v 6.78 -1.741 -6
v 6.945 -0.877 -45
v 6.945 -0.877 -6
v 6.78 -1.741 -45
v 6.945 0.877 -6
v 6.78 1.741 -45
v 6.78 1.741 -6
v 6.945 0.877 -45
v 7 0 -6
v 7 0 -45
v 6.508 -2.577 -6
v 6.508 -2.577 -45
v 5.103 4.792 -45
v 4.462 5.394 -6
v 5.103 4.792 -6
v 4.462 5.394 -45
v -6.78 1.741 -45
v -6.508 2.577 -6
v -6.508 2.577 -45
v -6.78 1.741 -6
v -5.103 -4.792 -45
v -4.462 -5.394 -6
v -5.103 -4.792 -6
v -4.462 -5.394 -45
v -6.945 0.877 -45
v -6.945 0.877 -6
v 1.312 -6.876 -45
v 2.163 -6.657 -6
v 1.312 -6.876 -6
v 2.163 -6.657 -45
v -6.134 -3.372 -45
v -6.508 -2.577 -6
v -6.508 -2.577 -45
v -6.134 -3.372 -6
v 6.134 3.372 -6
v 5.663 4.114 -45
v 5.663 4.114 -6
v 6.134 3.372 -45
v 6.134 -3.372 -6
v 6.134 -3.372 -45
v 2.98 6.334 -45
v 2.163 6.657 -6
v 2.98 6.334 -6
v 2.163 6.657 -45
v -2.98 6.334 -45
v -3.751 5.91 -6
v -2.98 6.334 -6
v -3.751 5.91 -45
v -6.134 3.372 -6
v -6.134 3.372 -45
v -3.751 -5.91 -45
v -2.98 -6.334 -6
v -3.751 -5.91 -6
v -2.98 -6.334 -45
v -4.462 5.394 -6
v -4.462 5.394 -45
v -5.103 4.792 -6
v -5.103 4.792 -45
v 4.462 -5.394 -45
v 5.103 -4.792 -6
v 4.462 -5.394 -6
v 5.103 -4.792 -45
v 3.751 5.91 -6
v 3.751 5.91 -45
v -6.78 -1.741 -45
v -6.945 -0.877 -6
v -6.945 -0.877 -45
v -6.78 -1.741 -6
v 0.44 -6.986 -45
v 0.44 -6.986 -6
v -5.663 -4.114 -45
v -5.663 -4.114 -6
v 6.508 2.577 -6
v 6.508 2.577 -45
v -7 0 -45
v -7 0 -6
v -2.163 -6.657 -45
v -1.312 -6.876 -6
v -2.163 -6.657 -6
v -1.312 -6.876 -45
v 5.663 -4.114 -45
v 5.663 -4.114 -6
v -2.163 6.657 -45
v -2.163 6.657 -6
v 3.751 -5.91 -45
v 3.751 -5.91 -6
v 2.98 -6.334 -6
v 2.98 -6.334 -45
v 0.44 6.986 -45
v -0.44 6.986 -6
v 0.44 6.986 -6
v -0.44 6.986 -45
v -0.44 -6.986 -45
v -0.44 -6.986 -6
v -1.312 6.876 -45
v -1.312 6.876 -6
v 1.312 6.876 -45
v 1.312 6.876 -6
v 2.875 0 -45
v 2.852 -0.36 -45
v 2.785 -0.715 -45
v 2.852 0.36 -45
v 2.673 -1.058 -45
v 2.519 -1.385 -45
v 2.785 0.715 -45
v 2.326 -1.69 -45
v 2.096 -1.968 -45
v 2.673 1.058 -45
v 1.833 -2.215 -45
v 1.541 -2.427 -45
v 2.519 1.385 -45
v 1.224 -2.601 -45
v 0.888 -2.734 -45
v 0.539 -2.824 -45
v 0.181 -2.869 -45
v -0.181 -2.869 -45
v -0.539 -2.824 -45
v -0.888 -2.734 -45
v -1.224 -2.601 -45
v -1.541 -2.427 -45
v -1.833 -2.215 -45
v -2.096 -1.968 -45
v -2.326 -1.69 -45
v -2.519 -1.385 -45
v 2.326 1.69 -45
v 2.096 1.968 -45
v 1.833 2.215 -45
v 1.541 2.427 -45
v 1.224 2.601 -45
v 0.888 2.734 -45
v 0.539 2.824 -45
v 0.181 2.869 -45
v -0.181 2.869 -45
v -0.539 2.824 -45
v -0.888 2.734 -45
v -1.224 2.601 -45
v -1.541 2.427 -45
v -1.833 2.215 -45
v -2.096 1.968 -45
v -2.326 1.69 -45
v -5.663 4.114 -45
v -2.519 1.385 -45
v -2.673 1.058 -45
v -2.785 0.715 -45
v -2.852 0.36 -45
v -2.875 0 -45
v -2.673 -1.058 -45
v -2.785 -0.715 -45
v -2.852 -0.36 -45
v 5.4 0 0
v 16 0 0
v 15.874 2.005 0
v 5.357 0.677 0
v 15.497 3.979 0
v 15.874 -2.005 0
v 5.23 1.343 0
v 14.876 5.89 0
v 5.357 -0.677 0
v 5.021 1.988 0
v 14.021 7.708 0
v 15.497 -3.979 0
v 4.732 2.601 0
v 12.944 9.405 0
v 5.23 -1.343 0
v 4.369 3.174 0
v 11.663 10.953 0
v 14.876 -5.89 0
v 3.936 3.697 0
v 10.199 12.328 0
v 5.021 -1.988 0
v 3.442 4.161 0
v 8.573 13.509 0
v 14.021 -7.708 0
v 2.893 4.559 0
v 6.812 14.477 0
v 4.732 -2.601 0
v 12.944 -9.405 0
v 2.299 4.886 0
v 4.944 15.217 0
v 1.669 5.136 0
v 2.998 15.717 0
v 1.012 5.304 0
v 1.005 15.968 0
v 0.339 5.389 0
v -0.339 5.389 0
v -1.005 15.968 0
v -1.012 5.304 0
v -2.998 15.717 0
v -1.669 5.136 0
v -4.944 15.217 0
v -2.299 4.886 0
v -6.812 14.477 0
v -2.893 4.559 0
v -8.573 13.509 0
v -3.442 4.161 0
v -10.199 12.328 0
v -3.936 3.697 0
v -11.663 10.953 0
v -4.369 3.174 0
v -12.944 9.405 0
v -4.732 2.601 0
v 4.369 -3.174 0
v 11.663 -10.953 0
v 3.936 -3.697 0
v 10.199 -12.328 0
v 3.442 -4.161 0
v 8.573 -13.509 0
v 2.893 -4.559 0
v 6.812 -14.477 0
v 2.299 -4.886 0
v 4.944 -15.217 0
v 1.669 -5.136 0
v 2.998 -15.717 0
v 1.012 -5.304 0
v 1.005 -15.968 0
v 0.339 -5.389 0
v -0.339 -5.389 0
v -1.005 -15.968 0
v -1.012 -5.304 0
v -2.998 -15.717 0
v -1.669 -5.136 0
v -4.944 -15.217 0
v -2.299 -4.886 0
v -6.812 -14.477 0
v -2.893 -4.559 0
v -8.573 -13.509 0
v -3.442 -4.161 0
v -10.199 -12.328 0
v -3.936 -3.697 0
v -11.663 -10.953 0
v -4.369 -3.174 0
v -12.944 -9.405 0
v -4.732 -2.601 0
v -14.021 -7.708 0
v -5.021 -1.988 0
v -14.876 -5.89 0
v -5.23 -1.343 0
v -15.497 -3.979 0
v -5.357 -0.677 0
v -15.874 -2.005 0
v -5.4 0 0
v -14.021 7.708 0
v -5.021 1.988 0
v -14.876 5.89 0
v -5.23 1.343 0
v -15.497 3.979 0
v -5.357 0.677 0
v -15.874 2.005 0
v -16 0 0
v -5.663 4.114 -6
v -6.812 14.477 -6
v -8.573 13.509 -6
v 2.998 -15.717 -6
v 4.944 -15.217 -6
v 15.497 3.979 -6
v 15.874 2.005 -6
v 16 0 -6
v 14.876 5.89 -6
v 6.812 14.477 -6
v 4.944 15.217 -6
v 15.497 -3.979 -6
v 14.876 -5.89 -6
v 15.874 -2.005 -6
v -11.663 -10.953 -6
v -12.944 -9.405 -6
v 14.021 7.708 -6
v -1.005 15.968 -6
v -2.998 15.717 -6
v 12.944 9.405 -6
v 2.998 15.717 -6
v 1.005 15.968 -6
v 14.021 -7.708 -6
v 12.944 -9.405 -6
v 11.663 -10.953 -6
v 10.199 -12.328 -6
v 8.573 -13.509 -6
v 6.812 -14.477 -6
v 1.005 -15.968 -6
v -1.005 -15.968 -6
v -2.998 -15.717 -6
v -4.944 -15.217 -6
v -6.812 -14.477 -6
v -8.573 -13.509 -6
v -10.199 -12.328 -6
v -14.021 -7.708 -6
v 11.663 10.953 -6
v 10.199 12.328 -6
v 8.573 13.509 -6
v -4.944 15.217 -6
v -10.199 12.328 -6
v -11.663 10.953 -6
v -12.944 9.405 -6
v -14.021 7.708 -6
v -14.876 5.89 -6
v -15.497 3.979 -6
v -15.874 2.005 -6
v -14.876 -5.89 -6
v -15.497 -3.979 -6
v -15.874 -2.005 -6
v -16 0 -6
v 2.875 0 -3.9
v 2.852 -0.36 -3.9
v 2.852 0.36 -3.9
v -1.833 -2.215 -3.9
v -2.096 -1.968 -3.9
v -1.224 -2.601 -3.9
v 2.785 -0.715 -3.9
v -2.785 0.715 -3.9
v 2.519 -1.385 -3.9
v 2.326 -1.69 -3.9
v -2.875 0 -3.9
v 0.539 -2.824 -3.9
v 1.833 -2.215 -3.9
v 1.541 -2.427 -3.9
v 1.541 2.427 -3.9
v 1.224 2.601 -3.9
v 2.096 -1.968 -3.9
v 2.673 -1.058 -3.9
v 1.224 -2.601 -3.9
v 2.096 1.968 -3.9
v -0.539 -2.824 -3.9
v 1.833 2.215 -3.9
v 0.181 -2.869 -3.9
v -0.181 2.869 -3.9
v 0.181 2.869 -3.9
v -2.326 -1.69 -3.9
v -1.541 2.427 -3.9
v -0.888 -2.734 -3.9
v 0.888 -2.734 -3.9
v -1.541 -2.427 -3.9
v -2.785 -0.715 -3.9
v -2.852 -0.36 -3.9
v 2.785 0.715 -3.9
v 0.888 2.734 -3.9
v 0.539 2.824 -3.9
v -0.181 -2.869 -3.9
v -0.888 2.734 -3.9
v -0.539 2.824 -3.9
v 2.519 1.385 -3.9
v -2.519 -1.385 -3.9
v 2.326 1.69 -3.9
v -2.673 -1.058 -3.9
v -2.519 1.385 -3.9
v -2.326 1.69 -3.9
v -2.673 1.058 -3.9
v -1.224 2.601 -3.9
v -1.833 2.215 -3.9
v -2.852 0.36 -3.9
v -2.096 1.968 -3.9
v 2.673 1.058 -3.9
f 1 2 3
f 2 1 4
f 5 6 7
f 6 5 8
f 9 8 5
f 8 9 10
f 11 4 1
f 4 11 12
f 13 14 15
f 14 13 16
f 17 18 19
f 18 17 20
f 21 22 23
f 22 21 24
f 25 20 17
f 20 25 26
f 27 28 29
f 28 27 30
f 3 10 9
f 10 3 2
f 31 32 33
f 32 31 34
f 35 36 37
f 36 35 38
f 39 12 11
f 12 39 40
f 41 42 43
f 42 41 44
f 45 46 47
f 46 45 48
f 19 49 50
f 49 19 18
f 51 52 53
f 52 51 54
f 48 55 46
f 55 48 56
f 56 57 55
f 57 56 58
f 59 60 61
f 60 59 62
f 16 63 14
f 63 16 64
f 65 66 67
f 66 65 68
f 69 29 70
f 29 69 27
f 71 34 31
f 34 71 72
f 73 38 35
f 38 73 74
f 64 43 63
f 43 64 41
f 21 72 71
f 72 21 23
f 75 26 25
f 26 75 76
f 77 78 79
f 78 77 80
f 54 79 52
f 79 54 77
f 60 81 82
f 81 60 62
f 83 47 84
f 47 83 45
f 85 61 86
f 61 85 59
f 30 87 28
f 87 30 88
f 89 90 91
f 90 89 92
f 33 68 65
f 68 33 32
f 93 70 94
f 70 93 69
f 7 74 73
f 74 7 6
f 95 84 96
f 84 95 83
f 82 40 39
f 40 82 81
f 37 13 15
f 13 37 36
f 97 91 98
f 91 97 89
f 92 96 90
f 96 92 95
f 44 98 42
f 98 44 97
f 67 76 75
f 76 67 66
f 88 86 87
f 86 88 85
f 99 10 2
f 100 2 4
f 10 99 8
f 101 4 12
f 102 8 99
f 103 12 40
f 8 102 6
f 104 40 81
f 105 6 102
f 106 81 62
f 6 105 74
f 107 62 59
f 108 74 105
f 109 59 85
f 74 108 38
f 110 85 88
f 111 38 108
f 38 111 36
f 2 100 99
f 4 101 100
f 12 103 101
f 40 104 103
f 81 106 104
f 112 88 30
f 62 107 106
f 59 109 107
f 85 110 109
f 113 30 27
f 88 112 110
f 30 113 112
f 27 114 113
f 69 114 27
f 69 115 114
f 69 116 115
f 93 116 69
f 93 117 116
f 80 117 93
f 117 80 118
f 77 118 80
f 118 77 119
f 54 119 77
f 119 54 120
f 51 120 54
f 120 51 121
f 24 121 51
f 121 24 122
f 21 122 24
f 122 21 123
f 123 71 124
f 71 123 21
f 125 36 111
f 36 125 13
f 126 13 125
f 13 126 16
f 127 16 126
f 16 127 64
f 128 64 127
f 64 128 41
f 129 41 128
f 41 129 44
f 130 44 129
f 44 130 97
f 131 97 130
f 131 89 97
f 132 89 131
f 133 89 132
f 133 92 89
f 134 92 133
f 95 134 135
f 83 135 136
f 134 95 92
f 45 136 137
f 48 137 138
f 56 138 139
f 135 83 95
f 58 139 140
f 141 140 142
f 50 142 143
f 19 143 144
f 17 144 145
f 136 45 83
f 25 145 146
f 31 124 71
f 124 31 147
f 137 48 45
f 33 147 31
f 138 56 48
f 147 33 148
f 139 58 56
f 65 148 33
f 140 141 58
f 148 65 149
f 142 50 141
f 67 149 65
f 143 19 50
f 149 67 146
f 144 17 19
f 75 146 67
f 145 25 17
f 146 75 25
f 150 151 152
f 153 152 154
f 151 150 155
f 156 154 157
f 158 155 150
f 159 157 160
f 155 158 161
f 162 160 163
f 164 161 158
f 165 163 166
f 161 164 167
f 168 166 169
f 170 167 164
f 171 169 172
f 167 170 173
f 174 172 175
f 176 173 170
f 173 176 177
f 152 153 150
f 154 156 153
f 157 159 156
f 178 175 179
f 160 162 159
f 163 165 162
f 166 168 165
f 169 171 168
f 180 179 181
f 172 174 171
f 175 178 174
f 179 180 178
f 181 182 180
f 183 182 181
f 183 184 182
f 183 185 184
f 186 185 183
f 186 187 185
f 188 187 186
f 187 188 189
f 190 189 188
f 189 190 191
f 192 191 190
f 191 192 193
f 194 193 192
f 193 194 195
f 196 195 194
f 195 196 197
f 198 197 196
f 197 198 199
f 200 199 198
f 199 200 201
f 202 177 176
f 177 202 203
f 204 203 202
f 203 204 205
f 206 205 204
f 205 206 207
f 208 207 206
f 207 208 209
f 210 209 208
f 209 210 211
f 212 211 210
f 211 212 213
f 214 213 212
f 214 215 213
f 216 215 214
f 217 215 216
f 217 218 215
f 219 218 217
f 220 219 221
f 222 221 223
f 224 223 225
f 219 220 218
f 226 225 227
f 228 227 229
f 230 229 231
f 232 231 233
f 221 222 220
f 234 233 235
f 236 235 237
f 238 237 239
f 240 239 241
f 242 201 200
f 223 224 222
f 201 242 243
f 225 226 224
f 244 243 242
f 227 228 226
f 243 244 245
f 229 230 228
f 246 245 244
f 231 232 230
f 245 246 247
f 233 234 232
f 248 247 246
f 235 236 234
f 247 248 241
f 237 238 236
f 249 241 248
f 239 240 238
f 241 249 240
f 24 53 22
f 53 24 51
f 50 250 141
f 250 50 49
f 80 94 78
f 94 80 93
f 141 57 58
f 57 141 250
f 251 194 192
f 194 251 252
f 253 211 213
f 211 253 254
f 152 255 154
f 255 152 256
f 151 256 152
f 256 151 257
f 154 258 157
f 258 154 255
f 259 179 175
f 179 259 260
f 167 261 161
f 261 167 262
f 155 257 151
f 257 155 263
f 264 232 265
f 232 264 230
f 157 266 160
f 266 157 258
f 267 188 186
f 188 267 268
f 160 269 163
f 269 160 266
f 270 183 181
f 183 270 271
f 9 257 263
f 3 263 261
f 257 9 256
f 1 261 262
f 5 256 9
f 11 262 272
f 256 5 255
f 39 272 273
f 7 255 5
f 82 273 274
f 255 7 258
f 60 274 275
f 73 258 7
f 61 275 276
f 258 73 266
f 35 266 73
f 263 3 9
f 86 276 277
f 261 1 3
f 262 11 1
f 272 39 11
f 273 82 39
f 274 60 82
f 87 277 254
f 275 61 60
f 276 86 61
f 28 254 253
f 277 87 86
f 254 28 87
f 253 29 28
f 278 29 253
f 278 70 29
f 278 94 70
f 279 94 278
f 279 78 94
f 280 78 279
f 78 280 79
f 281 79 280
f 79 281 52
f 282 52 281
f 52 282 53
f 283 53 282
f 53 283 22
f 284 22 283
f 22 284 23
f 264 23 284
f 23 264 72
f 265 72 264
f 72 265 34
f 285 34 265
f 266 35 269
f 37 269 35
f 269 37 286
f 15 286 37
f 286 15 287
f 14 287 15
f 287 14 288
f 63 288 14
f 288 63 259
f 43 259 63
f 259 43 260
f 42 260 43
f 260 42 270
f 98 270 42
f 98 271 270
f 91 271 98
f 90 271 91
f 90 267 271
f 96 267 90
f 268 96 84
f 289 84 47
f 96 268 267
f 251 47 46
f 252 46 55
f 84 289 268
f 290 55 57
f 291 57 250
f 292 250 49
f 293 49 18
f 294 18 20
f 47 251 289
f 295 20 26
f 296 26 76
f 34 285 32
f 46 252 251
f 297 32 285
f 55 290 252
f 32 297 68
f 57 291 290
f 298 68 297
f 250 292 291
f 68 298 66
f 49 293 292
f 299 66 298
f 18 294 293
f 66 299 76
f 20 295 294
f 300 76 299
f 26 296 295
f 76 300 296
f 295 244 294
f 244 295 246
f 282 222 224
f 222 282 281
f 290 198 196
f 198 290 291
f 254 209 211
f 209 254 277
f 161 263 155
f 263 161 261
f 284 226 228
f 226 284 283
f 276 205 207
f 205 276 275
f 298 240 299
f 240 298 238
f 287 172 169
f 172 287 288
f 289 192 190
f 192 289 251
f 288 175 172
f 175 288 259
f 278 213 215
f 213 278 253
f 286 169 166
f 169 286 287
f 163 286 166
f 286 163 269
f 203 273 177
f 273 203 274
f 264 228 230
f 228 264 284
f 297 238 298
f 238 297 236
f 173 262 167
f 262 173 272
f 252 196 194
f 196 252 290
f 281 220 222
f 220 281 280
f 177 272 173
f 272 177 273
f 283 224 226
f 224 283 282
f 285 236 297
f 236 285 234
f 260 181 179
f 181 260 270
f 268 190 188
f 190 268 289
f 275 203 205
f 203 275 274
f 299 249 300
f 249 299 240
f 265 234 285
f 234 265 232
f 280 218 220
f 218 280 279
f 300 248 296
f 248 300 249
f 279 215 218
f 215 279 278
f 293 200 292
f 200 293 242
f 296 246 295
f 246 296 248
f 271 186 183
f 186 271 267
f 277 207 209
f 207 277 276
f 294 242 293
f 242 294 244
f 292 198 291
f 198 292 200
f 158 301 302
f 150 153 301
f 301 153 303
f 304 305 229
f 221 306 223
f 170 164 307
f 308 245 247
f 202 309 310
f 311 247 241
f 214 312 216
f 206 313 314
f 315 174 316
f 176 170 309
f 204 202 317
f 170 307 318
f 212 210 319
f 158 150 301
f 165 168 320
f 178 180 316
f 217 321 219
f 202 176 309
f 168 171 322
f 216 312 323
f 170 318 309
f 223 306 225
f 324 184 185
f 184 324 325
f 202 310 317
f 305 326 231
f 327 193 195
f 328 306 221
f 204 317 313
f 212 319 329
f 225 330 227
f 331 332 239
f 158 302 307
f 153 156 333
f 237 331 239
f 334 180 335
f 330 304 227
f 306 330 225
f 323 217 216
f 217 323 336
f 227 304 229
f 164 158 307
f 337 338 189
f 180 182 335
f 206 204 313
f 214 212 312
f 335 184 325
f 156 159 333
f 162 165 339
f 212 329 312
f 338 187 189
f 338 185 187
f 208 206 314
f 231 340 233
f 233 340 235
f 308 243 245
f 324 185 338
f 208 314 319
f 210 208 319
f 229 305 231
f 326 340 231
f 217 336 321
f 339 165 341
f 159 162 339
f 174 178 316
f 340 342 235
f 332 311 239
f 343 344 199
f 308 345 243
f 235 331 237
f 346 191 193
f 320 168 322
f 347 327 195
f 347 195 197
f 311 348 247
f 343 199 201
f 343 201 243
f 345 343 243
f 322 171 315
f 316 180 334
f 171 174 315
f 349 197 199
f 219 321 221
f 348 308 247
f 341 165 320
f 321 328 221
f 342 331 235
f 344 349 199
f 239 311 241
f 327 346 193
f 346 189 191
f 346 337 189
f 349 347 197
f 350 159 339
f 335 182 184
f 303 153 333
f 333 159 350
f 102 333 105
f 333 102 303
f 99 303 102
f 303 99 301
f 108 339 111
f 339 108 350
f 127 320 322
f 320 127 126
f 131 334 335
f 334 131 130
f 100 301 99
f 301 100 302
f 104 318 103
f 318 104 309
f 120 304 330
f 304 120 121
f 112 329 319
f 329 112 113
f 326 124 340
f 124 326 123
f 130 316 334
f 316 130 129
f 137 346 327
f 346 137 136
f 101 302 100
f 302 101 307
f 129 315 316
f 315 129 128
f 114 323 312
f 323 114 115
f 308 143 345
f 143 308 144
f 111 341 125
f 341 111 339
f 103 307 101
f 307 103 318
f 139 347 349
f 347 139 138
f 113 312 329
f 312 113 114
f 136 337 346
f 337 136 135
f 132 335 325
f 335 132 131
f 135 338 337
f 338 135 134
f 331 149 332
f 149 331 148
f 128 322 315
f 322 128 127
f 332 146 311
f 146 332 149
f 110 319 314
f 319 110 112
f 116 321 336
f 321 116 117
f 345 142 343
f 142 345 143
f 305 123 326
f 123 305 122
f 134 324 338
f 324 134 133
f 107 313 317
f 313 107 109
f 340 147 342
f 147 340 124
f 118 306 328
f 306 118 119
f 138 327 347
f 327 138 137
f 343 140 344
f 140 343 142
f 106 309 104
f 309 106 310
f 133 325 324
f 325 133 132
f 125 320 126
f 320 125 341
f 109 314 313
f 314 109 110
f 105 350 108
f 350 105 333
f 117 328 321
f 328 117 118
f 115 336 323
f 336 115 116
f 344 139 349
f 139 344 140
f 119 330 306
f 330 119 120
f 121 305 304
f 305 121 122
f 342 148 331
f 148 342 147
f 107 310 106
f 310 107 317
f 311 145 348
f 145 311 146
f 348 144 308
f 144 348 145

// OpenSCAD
$fn = 50;


difference() {
	union() {
		translate(v = [0, 0, -45.0000000000]) {
			cylinder(h = 45, r = 7.0000000000);
		}
		translate(v = [0, 0, -6.0000000000]) {
			cylinder(h = 6, r = 16.0000000000);
		}
	}
	union() {
		translate(v = [0, 0, 0]) {
			rotate(a = [0, 0, 0]) {
				difference() {
					union() {
						#translate(v = [0, 0, -45.0000000000]) {
							cylinder(h = 45, r = 2.6000000000);
						}
						#translate(v = [0, 0, -3.9000000000]) {
							cylinder(h = 3.9000000000, r1 = 2.8750000000, r2 = 5.4000000000);
						}
						#translate(v = [0, 0, -45.0000000000]) {
							cylinder(h = 45, r = 2.8750000000);
						}
						#translate(v = [0, 0, -45.0000000000]) {
							cylinder(h = 45, r = 2.6000000000);
						}
					}
					union();
				}
			}
		}
	}
}
